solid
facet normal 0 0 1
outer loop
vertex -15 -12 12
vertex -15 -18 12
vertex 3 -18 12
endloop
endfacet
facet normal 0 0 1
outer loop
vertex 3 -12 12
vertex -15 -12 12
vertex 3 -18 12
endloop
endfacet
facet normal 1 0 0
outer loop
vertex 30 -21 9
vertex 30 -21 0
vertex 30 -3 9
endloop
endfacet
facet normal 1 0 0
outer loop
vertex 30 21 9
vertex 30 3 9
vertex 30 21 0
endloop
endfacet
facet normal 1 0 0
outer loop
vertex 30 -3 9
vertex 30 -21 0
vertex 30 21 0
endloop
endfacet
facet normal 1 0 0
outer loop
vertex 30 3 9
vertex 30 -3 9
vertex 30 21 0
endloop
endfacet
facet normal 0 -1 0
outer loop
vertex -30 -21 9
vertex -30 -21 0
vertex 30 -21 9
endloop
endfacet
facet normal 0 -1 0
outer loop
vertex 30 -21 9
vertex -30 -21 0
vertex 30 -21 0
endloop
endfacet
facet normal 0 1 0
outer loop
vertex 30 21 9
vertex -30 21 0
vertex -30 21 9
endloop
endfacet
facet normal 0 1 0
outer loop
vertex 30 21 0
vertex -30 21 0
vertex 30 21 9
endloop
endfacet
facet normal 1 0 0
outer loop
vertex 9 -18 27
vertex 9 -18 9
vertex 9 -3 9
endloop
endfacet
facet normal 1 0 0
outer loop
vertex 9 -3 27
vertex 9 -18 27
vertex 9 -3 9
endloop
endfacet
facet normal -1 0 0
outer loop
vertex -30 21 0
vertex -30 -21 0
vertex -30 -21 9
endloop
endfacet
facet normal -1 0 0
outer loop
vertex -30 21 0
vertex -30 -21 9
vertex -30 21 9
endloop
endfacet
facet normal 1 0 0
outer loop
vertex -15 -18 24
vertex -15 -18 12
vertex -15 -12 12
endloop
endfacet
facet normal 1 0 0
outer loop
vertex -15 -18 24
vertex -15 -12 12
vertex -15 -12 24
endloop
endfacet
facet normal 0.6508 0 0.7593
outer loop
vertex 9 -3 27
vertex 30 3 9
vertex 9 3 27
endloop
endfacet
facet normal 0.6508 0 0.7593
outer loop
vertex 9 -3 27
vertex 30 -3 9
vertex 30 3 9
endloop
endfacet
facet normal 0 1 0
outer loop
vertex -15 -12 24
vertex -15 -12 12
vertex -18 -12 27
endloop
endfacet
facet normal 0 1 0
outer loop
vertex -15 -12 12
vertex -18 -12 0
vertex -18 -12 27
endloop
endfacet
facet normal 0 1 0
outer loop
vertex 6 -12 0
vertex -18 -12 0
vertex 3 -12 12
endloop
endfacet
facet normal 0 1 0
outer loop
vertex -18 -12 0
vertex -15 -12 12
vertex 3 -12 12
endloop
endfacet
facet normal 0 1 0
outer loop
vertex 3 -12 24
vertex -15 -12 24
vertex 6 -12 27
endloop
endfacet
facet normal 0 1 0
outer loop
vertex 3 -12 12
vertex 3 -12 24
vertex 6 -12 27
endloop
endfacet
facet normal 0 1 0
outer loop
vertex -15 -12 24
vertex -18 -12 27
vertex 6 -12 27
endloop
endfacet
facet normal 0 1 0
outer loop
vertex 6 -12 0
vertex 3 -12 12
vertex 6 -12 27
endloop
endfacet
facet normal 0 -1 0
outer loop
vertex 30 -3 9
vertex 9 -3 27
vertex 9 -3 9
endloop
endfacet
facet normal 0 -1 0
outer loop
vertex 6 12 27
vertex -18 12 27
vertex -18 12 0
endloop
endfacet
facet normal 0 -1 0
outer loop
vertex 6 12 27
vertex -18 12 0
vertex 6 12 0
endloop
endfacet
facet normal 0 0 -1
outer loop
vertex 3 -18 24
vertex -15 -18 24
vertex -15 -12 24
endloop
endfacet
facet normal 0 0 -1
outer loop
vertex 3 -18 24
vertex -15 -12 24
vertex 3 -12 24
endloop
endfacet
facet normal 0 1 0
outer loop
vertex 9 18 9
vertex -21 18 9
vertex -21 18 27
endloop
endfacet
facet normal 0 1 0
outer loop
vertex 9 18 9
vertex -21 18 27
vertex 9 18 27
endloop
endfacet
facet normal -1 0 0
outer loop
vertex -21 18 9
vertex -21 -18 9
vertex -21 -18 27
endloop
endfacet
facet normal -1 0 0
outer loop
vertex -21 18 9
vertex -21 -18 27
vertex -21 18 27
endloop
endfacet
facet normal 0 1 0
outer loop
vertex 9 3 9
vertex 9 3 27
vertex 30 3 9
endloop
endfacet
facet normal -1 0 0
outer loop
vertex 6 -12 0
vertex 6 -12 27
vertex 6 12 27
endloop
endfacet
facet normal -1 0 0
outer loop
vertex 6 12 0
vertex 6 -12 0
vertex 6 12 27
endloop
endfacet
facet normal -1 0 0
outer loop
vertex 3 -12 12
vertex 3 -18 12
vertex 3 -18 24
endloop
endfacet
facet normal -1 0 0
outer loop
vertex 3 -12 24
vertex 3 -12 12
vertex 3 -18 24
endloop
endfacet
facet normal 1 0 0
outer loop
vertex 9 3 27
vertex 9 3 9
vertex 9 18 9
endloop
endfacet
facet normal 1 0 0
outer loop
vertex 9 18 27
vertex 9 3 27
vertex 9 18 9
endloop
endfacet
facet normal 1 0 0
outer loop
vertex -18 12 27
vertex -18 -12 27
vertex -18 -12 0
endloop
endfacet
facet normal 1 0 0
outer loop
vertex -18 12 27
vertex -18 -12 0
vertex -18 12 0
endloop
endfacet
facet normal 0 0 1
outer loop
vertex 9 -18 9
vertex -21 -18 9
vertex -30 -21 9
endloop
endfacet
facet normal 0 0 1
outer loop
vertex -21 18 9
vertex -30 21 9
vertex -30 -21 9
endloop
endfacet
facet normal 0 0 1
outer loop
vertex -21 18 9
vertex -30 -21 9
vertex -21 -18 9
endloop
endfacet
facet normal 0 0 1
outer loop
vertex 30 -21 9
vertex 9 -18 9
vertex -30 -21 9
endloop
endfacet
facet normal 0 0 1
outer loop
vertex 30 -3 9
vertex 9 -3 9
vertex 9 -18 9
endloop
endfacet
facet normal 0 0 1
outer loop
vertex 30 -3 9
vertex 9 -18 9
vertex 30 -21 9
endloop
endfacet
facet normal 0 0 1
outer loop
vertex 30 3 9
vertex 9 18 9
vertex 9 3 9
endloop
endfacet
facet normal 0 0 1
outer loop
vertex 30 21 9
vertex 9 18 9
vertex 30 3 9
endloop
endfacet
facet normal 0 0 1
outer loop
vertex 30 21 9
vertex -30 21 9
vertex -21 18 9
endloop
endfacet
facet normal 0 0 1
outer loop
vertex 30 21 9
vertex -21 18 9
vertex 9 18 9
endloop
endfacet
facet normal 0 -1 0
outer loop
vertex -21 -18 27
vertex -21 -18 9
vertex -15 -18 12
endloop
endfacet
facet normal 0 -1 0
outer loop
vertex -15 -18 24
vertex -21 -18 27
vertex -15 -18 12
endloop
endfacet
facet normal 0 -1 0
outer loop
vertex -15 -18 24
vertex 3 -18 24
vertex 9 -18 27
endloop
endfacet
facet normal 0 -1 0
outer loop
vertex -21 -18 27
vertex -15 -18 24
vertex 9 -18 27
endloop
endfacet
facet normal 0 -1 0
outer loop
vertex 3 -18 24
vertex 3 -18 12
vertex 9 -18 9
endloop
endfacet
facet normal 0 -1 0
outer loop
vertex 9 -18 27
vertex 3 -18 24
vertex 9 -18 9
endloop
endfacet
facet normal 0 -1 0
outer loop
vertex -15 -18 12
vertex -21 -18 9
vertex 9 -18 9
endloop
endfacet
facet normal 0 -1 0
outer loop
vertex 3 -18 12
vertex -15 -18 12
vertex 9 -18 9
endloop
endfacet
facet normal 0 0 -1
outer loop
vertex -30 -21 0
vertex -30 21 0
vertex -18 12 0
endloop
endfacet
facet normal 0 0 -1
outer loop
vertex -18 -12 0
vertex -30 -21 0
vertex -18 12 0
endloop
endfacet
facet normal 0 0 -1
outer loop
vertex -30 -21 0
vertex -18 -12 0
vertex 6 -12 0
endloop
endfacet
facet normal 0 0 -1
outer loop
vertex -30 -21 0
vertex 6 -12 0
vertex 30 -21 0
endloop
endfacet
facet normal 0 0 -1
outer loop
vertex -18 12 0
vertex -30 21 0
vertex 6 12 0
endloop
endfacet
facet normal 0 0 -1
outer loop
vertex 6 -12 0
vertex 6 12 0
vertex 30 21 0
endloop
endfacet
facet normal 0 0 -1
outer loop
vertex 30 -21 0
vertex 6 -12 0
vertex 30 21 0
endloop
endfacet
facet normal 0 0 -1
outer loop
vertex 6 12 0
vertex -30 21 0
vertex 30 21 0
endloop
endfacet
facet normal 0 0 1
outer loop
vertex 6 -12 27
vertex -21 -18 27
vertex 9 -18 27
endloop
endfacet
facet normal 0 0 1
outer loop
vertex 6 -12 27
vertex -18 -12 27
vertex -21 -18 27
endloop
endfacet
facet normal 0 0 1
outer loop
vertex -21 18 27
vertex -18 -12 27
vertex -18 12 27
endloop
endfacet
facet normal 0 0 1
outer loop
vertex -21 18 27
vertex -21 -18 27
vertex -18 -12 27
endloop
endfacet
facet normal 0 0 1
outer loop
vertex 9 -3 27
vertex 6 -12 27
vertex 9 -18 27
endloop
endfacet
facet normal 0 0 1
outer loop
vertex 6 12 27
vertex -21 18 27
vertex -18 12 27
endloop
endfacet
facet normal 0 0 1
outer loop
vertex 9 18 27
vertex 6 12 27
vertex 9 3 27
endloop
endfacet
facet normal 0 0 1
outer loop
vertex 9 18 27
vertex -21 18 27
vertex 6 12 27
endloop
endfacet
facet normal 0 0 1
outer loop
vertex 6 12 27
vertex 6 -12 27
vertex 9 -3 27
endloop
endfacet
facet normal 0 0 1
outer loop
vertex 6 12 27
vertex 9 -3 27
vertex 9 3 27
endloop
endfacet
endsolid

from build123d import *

# Parameters (mm, degrees)
PAD002_DEPTH    = 3
SKETCH_W        = 60
SKETCH_H        = 42
PAD_DEPTH       = 9
SKETCH001_W     = 30
SKETCH001_H     = 36
PAD001_DEPTH    = 18
SKETCH002_W     = 24
SKETCH002_H     = 24
POCKET_DEPTH    = 27.001
SKETCH005_W     = 18
SKETCH005_H     = 12
POCKET001_DEPTH = 6


with BuildPart() as pad002:
    # Sketch004 → Pad002 (new body, symmetric)
    with BuildSketch(Plane.XZ):
        Polygon((9, 27), (9, 9), (30, 9), align=None)
    extrude(amount=PAD002_DEPTH, both=True)


with BuildPart() as fusion:
    # Sketch → Pad (new body)
    with BuildSketch(Plane.XY):
        Rectangle(SKETCH_W, SKETCH_H)
    extrude(amount=PAD_DEPTH)

    # Sketch001 → Pad001 (new body)
    with BuildSketch(Plane.XY.offset(9)):
        with Locations((-6, 0)):
            Rectangle(SKETCH001_W, SKETCH001_H)
    extrude(amount=PAD001_DEPTH)

    # Sketch002 → Pocket (cut, through all)
    with BuildSketch(Plane.XY.offset(27)):
        with Locations((-6, 0)):
            Rectangle(SKETCH002_W, SKETCH002_H)
    extrude(amount=-POCKET_DEPTH, mode=Mode.SUBTRACT)

    # Sketch005 → Pocket001 (cut)
    with BuildSketch(Plane.XZ.offset(18)):
        with Locations((-6, 18)):
            Rectangle(SKETCH005_W, SKETCH005_H)
    extrude(amount=-POCKET001_DEPTH, mode=Mode.SUBTRACT)

    # Fusion: union Pad002
    add(pad002.part)


solid = fusion.part
